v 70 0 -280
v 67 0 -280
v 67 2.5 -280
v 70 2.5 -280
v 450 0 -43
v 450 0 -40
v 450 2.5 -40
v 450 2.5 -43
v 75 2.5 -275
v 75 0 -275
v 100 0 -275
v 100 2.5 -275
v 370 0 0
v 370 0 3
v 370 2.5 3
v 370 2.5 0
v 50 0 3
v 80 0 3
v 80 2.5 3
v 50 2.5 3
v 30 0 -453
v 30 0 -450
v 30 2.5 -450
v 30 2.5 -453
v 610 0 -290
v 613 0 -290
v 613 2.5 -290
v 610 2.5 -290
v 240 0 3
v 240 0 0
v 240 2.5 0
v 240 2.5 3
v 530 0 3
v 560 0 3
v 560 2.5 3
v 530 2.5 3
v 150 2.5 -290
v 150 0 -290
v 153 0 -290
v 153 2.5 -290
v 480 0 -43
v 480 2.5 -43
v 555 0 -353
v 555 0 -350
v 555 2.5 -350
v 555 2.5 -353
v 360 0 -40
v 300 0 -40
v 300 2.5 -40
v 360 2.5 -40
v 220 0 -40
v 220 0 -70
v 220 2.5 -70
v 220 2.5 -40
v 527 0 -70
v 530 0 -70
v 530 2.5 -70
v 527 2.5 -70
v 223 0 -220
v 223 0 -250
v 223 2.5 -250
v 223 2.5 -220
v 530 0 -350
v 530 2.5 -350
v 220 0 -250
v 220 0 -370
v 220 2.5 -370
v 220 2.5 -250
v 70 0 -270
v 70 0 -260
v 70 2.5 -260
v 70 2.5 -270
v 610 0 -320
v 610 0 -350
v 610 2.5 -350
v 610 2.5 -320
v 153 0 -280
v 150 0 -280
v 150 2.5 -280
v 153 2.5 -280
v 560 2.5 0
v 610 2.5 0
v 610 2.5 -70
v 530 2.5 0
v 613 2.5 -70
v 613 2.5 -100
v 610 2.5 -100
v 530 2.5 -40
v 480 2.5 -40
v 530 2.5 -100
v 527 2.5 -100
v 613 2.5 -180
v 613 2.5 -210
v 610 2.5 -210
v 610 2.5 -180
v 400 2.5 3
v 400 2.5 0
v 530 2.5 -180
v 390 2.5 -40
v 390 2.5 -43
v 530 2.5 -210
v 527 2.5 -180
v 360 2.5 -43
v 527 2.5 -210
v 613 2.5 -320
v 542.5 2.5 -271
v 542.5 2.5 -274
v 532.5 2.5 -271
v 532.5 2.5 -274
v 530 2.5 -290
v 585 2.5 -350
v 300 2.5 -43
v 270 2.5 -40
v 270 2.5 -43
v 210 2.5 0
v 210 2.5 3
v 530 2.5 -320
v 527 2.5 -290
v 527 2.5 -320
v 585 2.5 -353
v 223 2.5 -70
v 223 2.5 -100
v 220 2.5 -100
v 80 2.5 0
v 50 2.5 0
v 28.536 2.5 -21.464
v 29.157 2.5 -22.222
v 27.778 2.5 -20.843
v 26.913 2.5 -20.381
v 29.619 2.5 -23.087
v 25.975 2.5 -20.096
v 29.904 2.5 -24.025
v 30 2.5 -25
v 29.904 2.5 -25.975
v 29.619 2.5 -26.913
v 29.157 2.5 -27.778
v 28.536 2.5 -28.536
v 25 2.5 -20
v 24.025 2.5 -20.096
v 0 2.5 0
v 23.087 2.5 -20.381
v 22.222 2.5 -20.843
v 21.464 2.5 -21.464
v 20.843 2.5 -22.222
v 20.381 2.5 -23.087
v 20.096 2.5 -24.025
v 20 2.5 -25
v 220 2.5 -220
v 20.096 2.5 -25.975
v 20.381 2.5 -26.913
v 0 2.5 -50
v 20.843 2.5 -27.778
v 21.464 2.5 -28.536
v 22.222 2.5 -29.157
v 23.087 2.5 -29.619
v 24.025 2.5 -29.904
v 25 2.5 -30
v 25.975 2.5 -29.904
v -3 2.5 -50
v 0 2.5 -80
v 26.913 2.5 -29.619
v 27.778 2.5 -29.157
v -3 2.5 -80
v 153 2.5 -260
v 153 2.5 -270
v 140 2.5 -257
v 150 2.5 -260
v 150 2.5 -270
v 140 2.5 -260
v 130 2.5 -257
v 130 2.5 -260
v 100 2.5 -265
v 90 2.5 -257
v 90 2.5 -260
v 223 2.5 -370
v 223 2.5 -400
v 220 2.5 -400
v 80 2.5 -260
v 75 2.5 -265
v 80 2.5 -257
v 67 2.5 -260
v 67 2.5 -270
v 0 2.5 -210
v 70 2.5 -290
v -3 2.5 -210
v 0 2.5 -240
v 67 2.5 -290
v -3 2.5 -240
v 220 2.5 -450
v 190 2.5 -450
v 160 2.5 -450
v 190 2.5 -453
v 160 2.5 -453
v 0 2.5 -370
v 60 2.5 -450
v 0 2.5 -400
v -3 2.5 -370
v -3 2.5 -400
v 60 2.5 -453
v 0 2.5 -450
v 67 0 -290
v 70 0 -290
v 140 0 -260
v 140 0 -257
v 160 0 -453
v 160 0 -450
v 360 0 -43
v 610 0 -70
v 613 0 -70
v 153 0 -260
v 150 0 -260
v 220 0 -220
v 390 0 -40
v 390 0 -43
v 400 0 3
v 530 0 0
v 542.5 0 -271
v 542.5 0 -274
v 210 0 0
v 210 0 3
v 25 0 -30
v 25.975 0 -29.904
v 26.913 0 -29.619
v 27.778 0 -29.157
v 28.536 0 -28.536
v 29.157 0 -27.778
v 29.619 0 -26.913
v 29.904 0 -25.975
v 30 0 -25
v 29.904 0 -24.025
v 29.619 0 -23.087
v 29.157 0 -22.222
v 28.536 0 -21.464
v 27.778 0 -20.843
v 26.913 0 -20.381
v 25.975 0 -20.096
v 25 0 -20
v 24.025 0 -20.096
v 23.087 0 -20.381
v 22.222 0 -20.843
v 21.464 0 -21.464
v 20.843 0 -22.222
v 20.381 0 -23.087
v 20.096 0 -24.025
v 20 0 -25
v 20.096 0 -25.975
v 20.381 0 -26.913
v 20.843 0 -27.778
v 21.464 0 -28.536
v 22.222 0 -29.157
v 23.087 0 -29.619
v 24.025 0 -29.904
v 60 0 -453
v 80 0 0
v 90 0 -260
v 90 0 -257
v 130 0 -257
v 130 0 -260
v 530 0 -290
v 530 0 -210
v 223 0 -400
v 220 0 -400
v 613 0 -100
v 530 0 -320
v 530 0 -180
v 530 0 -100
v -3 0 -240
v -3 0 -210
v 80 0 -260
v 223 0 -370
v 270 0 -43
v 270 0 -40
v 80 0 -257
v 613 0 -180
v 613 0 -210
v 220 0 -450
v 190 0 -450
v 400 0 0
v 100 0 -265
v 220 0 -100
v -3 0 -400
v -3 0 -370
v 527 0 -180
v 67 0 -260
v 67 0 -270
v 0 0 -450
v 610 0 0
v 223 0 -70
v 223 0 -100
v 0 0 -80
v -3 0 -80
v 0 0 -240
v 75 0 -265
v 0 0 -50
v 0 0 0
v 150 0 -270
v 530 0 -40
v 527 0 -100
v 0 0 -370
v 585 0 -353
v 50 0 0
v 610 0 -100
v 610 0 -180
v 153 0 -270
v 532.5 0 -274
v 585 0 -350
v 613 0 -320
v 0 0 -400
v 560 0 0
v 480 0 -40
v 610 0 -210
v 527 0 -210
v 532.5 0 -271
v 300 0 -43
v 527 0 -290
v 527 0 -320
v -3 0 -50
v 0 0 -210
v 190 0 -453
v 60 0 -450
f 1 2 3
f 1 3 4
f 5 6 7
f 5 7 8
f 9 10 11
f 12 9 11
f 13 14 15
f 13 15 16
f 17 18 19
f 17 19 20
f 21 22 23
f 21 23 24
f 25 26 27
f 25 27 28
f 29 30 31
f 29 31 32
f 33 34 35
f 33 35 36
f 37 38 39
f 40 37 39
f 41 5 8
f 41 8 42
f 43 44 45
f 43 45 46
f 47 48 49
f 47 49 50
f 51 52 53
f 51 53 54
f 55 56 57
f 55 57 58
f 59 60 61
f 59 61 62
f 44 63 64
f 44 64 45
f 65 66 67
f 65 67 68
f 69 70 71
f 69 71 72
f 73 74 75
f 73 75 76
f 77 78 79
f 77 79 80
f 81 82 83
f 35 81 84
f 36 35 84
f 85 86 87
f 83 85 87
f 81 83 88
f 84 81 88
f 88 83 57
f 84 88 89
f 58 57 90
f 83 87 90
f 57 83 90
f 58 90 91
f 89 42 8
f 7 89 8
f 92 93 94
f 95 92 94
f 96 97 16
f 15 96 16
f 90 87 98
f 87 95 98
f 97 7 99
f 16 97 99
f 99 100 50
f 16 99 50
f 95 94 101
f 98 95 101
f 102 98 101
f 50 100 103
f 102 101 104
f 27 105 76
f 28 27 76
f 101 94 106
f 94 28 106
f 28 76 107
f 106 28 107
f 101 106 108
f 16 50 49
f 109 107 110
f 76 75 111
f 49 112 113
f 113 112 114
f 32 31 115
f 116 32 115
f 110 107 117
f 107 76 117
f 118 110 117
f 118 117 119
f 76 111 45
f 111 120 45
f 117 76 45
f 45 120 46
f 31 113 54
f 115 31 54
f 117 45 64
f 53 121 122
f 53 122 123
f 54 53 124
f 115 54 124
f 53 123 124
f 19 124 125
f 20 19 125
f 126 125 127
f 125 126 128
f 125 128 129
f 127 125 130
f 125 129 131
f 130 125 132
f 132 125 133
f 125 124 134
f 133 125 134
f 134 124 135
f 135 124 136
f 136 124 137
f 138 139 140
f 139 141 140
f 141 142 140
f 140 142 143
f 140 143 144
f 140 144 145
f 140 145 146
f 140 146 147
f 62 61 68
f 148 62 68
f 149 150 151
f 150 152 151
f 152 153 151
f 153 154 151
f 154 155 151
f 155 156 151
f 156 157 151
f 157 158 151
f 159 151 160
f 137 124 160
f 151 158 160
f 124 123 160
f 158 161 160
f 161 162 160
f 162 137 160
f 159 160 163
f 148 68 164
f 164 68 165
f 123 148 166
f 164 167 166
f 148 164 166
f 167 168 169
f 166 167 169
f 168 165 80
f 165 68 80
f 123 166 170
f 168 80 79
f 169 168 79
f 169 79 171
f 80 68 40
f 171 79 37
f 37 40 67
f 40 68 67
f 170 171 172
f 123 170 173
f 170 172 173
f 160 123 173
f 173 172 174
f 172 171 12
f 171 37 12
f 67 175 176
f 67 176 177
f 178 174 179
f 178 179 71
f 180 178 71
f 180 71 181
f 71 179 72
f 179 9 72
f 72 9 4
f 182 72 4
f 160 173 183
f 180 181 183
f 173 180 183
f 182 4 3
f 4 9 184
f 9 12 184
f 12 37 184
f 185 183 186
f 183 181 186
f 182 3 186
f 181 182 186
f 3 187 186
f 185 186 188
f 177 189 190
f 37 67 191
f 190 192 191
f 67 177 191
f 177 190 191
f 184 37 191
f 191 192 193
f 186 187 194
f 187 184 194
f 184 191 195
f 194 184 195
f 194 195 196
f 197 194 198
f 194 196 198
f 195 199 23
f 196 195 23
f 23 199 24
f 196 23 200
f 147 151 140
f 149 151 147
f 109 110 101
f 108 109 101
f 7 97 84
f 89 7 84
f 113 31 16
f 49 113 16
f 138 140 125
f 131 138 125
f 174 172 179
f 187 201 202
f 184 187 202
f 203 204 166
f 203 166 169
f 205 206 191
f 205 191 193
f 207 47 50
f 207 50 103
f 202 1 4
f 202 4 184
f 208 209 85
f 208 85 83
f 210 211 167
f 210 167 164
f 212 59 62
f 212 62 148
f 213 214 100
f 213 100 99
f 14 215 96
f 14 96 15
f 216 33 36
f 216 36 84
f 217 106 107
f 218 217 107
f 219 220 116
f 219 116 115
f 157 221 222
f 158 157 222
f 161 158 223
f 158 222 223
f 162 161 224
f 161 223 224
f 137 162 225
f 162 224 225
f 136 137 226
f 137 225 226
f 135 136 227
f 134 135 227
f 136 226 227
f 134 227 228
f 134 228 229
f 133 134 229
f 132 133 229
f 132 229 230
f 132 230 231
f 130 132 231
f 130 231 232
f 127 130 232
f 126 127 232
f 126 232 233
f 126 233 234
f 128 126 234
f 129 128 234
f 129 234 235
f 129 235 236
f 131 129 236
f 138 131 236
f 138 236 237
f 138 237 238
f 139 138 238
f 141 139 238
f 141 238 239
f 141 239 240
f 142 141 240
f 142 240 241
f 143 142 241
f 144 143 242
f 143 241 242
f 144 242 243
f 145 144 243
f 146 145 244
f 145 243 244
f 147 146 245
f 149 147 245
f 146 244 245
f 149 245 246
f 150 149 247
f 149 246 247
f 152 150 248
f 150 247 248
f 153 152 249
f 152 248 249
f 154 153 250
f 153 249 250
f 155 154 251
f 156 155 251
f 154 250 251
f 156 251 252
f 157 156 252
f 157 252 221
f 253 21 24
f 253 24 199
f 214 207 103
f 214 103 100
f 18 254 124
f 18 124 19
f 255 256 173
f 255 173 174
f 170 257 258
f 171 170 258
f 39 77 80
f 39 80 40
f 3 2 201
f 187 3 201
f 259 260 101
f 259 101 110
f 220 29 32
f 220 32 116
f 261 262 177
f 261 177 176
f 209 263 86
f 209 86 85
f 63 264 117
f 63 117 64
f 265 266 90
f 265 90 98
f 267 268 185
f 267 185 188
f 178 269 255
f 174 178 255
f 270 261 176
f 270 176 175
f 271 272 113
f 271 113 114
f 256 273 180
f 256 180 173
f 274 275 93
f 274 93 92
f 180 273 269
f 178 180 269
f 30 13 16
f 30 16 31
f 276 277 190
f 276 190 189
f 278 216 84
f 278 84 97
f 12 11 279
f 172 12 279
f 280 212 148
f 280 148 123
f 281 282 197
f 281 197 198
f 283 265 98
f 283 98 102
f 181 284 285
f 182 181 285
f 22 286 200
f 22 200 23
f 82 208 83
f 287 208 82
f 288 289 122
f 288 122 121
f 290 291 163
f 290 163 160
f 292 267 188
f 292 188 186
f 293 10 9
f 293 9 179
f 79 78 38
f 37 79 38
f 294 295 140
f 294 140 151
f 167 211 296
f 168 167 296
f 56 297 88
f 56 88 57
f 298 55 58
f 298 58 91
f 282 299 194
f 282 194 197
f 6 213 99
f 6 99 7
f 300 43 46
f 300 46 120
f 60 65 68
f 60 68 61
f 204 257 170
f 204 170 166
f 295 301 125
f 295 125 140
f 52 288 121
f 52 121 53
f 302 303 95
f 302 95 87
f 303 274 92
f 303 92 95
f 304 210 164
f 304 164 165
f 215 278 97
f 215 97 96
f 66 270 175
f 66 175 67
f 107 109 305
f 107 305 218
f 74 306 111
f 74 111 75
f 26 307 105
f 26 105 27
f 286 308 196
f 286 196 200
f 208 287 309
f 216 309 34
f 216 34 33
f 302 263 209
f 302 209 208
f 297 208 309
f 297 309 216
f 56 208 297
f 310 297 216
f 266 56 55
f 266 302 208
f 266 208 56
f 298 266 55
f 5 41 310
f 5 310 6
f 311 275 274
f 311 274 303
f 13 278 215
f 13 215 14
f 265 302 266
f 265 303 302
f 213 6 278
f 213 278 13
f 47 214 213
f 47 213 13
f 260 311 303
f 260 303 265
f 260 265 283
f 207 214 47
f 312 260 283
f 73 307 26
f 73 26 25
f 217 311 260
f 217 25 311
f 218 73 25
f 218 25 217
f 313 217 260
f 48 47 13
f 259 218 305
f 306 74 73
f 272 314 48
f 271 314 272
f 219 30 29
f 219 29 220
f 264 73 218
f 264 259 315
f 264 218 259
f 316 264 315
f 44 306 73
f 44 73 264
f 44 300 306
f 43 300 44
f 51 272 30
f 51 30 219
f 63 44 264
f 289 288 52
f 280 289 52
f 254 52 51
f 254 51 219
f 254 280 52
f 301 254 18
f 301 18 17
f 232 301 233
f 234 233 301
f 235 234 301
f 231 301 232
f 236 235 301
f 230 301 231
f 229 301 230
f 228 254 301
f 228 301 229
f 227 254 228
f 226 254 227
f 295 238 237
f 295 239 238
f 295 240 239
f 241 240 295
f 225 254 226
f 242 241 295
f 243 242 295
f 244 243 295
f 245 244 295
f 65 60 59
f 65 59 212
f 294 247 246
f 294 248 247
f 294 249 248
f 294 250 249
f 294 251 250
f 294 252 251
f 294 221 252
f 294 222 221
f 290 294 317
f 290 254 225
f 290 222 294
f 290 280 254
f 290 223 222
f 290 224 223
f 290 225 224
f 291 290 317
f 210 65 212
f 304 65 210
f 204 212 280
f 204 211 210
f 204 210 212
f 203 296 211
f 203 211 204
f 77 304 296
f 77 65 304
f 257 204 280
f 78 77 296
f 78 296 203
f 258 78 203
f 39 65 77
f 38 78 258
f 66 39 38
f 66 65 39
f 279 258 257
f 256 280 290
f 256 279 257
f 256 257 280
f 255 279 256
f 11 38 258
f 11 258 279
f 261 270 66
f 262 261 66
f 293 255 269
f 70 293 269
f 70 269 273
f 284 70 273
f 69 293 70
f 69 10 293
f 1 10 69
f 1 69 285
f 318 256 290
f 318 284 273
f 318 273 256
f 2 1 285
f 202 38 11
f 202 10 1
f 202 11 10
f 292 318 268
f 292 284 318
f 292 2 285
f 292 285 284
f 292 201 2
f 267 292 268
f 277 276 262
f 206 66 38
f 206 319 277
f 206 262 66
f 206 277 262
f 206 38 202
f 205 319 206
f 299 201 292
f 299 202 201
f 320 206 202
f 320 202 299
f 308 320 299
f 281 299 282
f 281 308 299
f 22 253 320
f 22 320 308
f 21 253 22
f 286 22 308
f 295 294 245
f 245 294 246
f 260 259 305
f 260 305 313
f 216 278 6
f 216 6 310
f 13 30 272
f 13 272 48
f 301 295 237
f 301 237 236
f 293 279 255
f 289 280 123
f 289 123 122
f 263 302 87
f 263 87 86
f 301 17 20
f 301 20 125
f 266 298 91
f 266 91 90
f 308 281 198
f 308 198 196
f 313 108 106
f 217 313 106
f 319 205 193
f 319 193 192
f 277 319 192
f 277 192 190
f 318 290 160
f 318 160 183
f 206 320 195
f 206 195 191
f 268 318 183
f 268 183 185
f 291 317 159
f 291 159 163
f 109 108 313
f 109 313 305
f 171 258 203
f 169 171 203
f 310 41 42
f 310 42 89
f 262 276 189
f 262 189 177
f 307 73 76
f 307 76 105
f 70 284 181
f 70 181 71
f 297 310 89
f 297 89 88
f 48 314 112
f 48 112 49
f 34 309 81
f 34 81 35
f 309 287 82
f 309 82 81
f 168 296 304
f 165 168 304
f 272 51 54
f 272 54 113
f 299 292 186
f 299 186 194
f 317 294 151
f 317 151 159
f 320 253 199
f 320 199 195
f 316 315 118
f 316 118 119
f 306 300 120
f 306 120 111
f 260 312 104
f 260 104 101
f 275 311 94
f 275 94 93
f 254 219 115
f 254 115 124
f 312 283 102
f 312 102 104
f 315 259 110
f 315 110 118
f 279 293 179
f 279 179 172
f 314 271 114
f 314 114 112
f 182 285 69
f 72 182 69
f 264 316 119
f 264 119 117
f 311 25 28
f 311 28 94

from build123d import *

# Parameters (mm, degrees)
SKETCH1_W           = 3
SKETCH1_H           = 10
SKETCH1_W_2         = 10
SKETCH1_H_2         = 3
BOSS_EXTRUDE1_DEPTH = 2.5
SKETCH2_W           = 10
SKETCH2_H           = 3
CUT_EXTRUDE1_DEPTH  = 10
SKETCH3_R           = 5
SKETCH3_W           = 25
SKETCH3_H           = 10
CUT_EXTRUDE2_DEPTH  = 10


with BuildPart() as part:
    # Sketch1 → Boss-Extrude1 (new body)
    with BuildSketch(Plane(origin=(0, 0, 0), x_dir=(1, 0, 0), z_dir=(0, 1, 0))):
        Polygon((0, 0), (0, 50), (-3, 50), (-3, 80), (0, 80), (0, 210), (-3, 210), (-3, 240), (0, 240), (0, 370), (-3, 370), (-3, 400), (0, 400), (0, 450), (30, 450), (30, 453), (60, 453), (60, 450), (160, 450), (160, 453), (190, 453), (190, 450), (220, 450), (220, 400), (223, 400), (223, 370), (220, 370), (220, 250), (223, 250), (223, 220), (220, 220), (220, 100), (223, 100), (223, 70), (220, 70), (220, 40), (270, 40), (270, 43), (300, 43), (300, 40), (360, 40), (360, 43), (390, 43), (390, 40), (450, 40), (450, 43), (480, 43), (480, 40), (530, 40), (530, 70), (527, 70), (527, 100), (530, 100), (530, 180), (527, 180), (527, 210), (530, 210), (530, 290), (527, 290), (527, 320), (530, 320), (530, 350), (555, 350), (555, 353), (585, 353), (585, 350), (610, 350), (610, 320), (613, 320), (613, 290), (610, 290), (610, 210), (613, 210), (613, 180), (610, 180), (610, 100), (613, 100), (613, 70), (610, 70), (610, 0), (560, 0), (560, -3), (530, -3), (530, 0), (400, 0), (400, -3), (370, -3), (370, 0), (240, 0), (240, -3), (210, -3), (210, 0), (80, 0), (80, -3), (50, -3), (50, 0), align=None)
        with Locations((68.5, 265)):
            Rectangle(SKETCH1_W, SKETCH1_H, mode=Mode.SUBTRACT)
        with Locations((68.5, 285)):
            Rectangle(SKETCH1_W, SKETCH1_H, mode=Mode.SUBTRACT)
        with Locations((85, 258.5)):
            Rectangle(SKETCH1_W_2, SKETCH1_H_2, mode=Mode.SUBTRACT)
        with Locations((135, 258.5)):
            Rectangle(SKETCH1_W_2, SKETCH1_H_2, mode=Mode.SUBTRACT)
        with Locations((151.5, 265)):
            Rectangle(SKETCH1_W, SKETCH1_H, mode=Mode.SUBTRACT)
        with Locations((151.5, 285)):
            Rectangle(SKETCH1_W, SKETCH1_H, mode=Mode.SUBTRACT)
    extrude(amount=BOSS_EXTRUDE1_DEPTH)

    # Sketch2 → Cut-Extrude1 (cut)
    with BuildSketch(Plane(origin=(0, 2.5, 0), x_dir=(1, 0, 0), z_dir=(0, 1, 0))):
        with Locations((537.5, 272.5)):
            Rectangle(SKETCH2_W, SKETCH2_H)
    extrude(amount=-CUT_EXTRUDE1_DEPTH, mode=Mode.SUBTRACT)

    # Sketch3 → Cut-Extrude2 (cut)
    with BuildSketch(Plane.XZ):
        with Locations(Location((25, -25, 0), (0, 0, 270))):
            Circle(SKETCH3_R)
        with Locations((87.5, -270)):
            Rectangle(SKETCH3_W, SKETCH3_H)
    extrude(amount=-CUT_EXTRUDE2_DEPTH, mode=Mode.SUBTRACT)


solid = part.part
